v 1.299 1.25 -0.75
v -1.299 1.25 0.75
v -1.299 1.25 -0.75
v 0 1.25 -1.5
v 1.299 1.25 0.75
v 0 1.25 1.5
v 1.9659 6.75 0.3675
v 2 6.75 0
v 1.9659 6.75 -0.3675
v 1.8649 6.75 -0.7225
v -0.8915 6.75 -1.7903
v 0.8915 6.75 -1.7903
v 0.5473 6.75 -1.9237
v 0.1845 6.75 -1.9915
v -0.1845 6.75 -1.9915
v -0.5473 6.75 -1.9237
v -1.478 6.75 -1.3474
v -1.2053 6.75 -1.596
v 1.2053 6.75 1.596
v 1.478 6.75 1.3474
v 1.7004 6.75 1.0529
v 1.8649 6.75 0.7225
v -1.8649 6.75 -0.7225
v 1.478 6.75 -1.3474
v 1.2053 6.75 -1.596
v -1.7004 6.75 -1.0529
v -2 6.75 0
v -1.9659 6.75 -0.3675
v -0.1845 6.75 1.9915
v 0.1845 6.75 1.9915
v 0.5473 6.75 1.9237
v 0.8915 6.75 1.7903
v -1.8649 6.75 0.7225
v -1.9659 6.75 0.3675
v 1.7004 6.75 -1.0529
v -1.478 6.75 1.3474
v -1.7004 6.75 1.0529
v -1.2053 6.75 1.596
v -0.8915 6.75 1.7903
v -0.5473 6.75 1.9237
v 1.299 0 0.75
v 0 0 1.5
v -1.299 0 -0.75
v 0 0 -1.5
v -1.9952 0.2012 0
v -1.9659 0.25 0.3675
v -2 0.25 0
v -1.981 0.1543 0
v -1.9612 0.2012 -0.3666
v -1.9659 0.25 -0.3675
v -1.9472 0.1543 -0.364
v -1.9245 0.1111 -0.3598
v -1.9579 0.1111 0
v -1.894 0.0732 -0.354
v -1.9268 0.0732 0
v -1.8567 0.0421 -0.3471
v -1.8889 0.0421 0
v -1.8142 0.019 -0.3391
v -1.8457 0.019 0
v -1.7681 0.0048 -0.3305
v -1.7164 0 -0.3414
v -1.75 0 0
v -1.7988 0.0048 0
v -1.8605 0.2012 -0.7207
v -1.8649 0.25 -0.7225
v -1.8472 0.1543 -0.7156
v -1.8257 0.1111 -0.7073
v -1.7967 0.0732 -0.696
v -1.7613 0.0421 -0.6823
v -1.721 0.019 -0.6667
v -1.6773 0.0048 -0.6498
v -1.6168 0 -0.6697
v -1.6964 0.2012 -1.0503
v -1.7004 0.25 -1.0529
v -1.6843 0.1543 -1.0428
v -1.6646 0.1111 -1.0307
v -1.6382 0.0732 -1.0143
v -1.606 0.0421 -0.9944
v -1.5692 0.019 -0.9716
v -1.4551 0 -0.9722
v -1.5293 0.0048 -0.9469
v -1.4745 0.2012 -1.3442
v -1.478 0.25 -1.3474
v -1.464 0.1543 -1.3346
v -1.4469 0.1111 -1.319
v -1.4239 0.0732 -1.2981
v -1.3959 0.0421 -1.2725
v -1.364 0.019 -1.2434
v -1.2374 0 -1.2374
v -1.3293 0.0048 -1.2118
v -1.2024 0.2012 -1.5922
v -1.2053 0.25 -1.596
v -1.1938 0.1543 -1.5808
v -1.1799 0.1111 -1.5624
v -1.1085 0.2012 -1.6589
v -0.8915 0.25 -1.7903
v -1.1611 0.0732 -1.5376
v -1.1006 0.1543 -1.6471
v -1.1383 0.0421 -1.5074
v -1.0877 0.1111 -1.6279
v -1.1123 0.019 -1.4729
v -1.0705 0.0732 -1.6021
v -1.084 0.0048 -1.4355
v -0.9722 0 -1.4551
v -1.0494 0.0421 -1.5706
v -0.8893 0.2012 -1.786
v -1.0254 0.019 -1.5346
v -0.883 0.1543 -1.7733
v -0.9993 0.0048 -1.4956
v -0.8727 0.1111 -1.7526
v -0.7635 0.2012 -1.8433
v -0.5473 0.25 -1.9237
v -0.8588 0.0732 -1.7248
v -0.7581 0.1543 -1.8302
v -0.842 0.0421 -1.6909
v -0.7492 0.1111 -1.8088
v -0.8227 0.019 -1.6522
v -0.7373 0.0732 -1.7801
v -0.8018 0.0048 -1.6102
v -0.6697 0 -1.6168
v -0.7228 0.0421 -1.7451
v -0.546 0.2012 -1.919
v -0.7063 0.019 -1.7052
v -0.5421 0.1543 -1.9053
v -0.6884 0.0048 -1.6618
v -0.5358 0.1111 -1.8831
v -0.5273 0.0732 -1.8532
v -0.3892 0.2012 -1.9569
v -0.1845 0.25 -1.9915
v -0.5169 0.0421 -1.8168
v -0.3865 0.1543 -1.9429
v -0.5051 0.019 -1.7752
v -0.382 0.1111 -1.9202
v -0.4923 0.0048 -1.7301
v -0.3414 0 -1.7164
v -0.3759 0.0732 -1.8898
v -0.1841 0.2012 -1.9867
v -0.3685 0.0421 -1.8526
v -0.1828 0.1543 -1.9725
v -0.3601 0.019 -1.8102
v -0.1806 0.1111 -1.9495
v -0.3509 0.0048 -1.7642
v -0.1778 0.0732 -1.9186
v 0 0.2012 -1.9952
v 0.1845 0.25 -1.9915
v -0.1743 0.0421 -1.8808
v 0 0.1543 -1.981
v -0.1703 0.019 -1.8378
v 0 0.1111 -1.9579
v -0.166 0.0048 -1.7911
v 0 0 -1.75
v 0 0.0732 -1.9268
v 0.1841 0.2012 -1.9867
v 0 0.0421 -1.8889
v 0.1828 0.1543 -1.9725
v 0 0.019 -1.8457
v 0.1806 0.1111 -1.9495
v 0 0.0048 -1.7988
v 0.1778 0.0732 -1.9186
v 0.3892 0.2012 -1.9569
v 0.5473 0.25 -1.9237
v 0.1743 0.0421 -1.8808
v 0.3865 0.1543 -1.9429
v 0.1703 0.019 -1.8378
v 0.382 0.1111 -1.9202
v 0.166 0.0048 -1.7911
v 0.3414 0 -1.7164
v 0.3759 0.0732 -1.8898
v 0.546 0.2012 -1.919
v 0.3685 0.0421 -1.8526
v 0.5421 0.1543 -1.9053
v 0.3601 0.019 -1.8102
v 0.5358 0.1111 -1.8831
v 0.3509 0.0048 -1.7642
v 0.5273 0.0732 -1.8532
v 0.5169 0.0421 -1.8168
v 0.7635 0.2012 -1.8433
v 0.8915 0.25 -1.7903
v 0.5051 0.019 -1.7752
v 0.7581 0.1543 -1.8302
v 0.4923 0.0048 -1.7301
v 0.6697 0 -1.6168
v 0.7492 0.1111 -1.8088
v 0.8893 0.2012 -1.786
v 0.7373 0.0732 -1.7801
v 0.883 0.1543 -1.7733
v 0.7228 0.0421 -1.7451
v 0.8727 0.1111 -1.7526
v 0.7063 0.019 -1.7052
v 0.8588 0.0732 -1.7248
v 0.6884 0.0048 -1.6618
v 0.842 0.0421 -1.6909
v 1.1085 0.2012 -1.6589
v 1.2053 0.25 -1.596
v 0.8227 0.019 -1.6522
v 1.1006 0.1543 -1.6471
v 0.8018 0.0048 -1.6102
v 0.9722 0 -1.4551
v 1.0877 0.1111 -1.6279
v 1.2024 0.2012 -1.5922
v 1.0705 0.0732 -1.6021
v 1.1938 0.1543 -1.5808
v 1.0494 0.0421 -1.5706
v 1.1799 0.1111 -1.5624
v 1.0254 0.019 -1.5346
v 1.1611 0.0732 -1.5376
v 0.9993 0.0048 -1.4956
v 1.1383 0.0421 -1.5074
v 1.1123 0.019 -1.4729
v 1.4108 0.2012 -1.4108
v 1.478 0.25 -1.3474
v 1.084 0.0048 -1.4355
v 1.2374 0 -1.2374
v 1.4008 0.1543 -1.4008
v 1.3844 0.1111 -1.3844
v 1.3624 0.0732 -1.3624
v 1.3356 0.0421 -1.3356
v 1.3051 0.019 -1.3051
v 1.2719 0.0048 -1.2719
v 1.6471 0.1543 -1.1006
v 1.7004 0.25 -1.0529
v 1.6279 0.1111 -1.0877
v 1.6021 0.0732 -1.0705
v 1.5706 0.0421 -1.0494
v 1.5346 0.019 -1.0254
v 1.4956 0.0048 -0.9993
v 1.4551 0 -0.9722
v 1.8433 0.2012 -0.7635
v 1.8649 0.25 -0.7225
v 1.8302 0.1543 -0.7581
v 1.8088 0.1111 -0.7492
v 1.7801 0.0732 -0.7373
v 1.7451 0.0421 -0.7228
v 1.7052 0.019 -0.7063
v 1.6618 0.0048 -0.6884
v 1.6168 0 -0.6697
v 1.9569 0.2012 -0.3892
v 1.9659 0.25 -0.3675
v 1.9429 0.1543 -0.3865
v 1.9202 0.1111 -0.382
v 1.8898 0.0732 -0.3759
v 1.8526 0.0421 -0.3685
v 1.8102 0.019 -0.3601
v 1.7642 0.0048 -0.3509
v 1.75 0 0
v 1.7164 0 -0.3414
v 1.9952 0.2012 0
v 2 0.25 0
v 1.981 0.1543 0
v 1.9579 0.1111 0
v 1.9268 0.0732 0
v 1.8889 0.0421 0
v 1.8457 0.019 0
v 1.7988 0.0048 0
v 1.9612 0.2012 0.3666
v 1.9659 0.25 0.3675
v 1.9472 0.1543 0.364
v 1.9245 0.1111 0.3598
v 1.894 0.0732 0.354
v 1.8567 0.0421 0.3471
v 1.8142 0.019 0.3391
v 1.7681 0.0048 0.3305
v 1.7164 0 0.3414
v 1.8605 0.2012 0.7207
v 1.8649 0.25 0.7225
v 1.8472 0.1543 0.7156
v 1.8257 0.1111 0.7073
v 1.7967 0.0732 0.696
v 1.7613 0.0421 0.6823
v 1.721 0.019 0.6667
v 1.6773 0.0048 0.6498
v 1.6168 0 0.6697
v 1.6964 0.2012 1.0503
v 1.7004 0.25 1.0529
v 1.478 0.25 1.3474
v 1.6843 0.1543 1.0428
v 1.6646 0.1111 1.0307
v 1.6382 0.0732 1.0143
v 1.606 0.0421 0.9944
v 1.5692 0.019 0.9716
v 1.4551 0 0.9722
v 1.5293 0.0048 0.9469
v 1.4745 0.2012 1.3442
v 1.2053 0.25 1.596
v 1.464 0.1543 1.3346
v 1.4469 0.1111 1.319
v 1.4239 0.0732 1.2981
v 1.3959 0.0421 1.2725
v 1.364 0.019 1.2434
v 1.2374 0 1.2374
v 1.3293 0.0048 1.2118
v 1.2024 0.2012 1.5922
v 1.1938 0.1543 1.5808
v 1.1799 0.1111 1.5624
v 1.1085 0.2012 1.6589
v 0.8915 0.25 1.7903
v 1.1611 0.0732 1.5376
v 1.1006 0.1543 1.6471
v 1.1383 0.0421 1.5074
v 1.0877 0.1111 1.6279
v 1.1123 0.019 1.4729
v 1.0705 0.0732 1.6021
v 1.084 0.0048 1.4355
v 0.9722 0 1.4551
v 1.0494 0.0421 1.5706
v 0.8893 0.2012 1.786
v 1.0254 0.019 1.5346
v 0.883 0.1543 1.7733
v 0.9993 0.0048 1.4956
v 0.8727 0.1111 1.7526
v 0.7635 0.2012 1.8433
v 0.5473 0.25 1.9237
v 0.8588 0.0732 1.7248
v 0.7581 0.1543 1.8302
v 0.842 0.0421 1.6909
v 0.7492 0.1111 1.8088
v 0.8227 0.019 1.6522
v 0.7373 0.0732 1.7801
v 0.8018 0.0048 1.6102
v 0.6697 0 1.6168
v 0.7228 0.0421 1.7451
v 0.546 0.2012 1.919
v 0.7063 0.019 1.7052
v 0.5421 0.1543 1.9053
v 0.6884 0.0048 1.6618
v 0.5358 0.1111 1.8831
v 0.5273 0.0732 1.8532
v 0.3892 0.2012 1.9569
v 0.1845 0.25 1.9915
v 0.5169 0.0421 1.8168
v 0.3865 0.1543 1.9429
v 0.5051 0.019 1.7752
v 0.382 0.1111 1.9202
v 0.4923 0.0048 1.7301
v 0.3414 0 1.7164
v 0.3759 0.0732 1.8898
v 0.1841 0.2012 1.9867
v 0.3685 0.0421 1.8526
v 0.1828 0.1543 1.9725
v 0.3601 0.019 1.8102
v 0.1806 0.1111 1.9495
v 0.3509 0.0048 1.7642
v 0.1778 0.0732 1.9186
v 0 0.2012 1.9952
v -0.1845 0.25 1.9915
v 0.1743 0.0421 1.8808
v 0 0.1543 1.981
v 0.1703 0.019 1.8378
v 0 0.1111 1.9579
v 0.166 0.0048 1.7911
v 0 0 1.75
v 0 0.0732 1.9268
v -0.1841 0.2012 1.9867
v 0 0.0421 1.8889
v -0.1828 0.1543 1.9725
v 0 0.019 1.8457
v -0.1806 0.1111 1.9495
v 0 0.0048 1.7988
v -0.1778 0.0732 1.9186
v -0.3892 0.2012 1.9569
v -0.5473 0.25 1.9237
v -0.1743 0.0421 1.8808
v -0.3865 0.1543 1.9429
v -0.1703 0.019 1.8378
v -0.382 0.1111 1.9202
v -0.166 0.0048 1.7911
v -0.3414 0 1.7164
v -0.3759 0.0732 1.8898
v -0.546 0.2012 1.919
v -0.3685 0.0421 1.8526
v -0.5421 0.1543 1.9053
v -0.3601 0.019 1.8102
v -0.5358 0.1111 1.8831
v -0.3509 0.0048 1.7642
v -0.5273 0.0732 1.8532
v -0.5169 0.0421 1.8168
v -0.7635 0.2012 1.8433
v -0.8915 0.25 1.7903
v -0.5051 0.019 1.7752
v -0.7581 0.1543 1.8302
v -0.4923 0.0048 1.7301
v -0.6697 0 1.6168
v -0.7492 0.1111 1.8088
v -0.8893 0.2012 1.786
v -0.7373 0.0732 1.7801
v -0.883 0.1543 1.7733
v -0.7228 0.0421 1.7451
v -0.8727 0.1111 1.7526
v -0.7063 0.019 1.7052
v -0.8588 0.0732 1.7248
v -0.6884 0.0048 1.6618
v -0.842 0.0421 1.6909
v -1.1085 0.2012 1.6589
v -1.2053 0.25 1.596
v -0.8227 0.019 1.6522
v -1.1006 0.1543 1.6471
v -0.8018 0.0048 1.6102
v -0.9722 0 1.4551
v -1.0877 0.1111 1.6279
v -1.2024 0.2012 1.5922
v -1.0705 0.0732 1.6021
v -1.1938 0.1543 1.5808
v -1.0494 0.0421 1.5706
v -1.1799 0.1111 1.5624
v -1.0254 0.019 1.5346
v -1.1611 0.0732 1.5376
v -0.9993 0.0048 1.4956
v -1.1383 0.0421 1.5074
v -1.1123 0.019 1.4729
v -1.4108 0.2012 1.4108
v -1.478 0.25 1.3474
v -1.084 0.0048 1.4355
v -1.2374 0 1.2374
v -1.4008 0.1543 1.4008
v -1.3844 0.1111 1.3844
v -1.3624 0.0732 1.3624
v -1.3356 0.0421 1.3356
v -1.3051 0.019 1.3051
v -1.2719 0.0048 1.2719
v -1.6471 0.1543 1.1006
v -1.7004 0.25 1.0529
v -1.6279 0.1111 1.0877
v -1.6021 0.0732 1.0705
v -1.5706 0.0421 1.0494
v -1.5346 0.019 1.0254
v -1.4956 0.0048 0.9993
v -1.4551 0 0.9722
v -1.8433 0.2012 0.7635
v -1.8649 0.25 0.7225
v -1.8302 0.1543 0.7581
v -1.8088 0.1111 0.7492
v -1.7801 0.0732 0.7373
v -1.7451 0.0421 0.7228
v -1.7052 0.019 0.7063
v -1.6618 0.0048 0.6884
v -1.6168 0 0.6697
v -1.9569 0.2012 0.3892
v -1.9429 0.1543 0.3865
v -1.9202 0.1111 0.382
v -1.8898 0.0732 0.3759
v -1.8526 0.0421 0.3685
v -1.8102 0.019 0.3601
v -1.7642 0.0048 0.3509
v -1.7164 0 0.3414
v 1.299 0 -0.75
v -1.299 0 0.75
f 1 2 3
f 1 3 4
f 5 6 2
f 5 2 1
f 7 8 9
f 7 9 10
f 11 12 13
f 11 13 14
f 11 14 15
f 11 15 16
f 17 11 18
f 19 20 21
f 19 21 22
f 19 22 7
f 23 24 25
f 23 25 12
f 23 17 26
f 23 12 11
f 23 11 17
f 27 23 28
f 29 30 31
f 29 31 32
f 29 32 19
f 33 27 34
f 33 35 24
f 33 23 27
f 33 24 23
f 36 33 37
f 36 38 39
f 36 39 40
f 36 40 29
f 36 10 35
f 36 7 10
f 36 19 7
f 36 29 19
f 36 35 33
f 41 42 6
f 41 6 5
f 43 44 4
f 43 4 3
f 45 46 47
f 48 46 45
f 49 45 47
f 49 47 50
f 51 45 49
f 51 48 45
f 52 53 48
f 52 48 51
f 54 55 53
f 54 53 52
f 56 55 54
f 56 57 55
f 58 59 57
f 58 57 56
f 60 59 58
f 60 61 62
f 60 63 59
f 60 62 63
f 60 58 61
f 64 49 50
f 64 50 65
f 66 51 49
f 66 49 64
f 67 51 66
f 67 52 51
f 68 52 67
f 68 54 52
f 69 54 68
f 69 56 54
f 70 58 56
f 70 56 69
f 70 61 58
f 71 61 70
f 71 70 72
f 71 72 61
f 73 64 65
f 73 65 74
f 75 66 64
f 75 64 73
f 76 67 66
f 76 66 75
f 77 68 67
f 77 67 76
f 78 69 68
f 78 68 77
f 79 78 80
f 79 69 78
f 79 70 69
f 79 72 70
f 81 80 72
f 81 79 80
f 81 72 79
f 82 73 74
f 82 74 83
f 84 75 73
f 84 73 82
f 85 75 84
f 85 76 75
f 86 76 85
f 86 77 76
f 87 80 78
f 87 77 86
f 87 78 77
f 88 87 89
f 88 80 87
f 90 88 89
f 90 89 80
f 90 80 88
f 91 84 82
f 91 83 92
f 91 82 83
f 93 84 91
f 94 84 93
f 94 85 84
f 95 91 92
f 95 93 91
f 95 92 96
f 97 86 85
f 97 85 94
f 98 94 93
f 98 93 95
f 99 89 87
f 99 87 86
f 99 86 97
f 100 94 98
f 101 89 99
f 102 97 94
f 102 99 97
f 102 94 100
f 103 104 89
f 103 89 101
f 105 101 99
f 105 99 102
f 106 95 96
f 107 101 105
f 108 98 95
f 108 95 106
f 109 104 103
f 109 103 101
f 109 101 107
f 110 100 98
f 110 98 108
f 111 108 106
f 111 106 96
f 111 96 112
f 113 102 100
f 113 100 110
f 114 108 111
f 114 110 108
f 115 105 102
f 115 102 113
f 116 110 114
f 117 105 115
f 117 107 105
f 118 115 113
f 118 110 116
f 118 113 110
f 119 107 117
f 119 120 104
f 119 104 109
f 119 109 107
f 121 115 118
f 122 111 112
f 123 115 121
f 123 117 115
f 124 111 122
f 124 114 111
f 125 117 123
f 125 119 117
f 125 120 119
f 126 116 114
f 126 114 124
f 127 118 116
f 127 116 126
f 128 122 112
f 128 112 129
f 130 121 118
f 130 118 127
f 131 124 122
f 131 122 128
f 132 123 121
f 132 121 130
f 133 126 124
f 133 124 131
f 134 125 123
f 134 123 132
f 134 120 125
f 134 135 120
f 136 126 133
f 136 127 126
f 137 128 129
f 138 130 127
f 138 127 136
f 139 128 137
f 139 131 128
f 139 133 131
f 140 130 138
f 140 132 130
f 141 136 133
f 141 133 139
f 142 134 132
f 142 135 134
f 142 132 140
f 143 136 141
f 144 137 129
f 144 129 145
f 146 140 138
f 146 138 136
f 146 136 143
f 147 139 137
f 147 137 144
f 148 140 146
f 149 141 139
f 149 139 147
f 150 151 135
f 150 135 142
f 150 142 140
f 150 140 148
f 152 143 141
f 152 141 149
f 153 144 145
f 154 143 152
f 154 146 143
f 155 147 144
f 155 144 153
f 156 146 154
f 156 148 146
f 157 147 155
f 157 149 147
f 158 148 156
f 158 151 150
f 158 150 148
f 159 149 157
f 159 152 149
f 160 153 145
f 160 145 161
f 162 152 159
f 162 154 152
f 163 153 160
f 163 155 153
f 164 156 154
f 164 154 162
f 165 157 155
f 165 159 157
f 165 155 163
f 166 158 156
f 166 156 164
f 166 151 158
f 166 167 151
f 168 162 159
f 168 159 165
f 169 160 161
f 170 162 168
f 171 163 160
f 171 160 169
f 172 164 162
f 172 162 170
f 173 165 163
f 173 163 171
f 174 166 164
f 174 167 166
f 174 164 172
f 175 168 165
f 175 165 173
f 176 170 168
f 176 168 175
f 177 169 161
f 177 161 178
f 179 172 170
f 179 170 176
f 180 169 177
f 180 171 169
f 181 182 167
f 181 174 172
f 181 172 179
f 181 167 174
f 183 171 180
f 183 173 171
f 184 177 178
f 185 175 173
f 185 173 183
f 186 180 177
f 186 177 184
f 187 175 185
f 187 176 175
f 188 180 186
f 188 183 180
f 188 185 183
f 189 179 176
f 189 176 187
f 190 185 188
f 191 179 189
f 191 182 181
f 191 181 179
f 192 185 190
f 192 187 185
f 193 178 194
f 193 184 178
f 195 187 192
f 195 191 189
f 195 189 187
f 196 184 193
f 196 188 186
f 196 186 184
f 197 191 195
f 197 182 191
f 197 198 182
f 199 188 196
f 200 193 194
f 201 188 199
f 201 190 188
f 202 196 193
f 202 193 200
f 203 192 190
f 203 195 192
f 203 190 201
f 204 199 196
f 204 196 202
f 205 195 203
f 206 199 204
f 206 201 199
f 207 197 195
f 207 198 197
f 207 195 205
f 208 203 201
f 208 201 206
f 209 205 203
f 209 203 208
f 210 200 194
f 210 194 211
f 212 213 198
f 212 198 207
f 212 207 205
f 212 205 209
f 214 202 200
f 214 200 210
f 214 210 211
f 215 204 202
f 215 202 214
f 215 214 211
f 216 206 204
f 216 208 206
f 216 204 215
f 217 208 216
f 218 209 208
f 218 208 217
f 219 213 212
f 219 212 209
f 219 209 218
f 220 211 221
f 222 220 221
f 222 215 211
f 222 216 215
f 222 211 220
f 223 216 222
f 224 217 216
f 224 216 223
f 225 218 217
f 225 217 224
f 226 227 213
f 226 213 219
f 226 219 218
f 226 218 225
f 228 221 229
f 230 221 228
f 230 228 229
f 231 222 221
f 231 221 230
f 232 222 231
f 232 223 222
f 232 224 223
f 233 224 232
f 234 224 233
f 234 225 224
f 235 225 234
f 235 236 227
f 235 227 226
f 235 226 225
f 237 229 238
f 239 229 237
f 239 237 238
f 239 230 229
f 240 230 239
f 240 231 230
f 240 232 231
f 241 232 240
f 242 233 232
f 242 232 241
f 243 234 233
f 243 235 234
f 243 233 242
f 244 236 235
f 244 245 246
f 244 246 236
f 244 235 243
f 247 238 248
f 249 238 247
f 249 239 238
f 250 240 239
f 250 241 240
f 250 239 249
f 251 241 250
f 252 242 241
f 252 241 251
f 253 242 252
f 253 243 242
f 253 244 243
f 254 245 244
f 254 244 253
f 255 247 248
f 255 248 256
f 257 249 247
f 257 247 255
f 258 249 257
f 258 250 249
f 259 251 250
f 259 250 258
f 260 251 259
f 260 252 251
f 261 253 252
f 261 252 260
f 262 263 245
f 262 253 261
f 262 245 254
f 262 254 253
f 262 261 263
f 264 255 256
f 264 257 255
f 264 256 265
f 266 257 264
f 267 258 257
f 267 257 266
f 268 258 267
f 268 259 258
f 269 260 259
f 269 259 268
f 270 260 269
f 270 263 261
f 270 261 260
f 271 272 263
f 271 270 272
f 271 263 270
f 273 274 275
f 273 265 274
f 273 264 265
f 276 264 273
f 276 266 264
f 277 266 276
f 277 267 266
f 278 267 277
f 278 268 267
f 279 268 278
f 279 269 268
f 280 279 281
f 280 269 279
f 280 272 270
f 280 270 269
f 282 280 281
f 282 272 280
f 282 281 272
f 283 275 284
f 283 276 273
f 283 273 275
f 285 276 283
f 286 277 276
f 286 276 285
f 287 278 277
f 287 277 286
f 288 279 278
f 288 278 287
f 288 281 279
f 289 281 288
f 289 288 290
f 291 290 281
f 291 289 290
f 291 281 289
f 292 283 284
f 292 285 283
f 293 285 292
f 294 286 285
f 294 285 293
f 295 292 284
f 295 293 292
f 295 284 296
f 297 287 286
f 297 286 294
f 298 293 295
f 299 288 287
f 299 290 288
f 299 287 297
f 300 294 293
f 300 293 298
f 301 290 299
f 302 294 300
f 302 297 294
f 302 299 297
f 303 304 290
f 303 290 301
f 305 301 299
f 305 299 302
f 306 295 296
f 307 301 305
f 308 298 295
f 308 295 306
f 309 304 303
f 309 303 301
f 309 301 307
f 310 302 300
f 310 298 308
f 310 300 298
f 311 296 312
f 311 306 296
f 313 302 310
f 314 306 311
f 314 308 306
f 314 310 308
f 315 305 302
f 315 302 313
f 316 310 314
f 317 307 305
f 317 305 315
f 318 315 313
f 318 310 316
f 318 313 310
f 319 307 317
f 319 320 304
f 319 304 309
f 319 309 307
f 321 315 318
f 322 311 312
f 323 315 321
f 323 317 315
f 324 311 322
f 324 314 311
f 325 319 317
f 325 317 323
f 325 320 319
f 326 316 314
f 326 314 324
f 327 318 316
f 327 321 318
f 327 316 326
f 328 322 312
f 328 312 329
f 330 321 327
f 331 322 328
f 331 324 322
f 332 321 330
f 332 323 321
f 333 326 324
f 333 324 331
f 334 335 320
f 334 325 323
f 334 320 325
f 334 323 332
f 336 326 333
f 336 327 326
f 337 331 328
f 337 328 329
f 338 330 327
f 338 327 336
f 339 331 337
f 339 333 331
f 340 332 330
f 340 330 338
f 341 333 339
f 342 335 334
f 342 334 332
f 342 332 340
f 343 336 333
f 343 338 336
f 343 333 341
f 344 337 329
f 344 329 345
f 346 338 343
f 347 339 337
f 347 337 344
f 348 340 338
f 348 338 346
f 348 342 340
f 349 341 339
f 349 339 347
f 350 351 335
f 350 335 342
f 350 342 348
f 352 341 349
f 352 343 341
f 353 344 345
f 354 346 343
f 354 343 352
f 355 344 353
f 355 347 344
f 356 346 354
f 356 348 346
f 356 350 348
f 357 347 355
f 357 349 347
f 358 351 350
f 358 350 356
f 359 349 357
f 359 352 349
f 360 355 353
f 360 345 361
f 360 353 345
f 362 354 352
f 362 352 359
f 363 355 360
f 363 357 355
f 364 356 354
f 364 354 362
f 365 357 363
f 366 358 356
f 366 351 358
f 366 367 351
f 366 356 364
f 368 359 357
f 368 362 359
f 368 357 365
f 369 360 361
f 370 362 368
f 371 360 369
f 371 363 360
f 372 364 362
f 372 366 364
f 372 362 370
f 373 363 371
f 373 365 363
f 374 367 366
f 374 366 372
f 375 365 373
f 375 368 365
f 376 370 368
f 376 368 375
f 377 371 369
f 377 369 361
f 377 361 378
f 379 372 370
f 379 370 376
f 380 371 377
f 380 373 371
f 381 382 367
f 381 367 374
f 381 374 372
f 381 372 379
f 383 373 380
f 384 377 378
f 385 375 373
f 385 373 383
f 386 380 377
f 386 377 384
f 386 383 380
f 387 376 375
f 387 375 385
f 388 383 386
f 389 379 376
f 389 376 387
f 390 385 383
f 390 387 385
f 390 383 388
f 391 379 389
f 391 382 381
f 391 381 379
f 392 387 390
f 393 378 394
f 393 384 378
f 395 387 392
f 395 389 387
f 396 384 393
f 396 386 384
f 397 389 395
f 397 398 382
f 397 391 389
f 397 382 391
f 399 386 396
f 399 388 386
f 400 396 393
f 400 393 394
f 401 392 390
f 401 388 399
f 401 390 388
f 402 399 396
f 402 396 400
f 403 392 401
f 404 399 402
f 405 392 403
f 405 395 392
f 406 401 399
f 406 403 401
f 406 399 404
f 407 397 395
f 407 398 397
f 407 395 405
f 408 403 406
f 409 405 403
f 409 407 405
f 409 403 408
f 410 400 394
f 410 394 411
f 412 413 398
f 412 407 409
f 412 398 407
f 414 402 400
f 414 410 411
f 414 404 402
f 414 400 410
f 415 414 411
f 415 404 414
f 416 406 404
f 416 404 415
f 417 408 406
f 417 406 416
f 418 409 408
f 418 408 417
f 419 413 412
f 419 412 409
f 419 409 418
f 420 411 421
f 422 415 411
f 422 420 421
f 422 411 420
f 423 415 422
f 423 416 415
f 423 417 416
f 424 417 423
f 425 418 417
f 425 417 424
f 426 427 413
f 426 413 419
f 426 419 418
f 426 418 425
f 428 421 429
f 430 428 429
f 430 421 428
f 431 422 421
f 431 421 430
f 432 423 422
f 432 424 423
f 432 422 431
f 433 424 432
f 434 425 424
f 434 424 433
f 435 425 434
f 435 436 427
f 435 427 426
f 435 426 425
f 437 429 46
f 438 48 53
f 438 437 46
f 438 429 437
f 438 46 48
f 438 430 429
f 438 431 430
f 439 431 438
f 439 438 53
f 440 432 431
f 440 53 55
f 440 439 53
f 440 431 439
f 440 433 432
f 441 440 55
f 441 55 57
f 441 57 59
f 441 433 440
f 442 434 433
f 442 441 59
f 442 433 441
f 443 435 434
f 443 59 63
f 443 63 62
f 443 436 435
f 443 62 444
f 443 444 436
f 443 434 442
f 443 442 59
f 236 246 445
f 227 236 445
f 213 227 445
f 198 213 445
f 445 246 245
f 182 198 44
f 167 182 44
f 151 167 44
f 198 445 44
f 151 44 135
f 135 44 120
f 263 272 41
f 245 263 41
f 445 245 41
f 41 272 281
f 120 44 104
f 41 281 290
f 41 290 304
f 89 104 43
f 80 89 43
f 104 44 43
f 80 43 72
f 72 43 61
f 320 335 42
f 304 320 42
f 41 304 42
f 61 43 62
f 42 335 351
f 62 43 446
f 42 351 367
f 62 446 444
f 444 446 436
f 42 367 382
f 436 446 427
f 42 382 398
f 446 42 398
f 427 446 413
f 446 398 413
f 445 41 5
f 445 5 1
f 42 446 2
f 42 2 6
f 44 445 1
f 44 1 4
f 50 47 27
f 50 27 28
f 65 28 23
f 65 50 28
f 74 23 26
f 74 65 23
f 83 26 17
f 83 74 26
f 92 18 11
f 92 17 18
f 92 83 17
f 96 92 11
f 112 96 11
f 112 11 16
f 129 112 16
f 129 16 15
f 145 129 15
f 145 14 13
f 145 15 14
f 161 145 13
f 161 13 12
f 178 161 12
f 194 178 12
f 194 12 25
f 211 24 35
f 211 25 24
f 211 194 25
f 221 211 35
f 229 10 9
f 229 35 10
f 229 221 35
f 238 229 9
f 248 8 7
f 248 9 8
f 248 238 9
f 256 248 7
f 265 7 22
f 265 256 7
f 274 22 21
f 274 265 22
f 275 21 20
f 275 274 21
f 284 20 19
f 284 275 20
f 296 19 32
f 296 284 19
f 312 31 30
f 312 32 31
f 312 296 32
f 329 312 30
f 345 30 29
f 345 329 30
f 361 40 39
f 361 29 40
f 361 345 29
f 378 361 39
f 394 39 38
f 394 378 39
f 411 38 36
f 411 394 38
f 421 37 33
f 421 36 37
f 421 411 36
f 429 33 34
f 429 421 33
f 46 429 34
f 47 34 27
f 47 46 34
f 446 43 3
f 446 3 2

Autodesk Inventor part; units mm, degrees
ref_plane "YZ Plane" through (0, 0, 0) normal (1, 0, 0) x (0, 1, 0)
ref_plane "XZ Plane" through (0, 0, 0) normal (0, 1, 0) x (-1, 0, 0)
ref_plane "XY Plane" through (0, 0, 0) normal (0, 0, 1) x (1, 0, 0)
sketch "Эскиз1" plane through (0, 0, 0) normal (0, 1, 0) x (-1, 0, 0)
  circle A0 centre (0, 0) radius 2
  dimension "d0" = 4
extrude "Выдавливание1" add sketch "Эскиз1" along normal blind 6.75
sketch "Эскиз2" plane through (0, 0, 0) normal (0, -1, 0) x (1, 0, 0)
  circle A0 centre (0, 0) radius 2 projected
  circle A1 centre (0, 0) radius 1.5 construction
  line L0 (0, 1.5) -> (1.299, 0.75)
  line L1 (1.299, 0.75) -> (1.299, -0.75)
  line L2 (1.299, -0.75) -> (0, -1.5)
  line L3 (0, -1.5) -> (-1.299, -0.75)
  line L4 (-1.299, -0.75) -> (-1.299, 0.75)
  line L5 (-1.299, 0.75) -> (0, 1.5)
  dimension "d3" = 3
extrude "Выдавливание2" cut sketch "Эскиз2" against normal blind 1.25 contours L0 L1 L2 L3 L4 L5
fillet "Сопряжение1" radius 0.25 1 edges at (2, 0, 0)
thread "Резьба1" size "M4x0.7" class "6g" standard "ANSI Metric M Profile" full length
properties part number "Bolt"
